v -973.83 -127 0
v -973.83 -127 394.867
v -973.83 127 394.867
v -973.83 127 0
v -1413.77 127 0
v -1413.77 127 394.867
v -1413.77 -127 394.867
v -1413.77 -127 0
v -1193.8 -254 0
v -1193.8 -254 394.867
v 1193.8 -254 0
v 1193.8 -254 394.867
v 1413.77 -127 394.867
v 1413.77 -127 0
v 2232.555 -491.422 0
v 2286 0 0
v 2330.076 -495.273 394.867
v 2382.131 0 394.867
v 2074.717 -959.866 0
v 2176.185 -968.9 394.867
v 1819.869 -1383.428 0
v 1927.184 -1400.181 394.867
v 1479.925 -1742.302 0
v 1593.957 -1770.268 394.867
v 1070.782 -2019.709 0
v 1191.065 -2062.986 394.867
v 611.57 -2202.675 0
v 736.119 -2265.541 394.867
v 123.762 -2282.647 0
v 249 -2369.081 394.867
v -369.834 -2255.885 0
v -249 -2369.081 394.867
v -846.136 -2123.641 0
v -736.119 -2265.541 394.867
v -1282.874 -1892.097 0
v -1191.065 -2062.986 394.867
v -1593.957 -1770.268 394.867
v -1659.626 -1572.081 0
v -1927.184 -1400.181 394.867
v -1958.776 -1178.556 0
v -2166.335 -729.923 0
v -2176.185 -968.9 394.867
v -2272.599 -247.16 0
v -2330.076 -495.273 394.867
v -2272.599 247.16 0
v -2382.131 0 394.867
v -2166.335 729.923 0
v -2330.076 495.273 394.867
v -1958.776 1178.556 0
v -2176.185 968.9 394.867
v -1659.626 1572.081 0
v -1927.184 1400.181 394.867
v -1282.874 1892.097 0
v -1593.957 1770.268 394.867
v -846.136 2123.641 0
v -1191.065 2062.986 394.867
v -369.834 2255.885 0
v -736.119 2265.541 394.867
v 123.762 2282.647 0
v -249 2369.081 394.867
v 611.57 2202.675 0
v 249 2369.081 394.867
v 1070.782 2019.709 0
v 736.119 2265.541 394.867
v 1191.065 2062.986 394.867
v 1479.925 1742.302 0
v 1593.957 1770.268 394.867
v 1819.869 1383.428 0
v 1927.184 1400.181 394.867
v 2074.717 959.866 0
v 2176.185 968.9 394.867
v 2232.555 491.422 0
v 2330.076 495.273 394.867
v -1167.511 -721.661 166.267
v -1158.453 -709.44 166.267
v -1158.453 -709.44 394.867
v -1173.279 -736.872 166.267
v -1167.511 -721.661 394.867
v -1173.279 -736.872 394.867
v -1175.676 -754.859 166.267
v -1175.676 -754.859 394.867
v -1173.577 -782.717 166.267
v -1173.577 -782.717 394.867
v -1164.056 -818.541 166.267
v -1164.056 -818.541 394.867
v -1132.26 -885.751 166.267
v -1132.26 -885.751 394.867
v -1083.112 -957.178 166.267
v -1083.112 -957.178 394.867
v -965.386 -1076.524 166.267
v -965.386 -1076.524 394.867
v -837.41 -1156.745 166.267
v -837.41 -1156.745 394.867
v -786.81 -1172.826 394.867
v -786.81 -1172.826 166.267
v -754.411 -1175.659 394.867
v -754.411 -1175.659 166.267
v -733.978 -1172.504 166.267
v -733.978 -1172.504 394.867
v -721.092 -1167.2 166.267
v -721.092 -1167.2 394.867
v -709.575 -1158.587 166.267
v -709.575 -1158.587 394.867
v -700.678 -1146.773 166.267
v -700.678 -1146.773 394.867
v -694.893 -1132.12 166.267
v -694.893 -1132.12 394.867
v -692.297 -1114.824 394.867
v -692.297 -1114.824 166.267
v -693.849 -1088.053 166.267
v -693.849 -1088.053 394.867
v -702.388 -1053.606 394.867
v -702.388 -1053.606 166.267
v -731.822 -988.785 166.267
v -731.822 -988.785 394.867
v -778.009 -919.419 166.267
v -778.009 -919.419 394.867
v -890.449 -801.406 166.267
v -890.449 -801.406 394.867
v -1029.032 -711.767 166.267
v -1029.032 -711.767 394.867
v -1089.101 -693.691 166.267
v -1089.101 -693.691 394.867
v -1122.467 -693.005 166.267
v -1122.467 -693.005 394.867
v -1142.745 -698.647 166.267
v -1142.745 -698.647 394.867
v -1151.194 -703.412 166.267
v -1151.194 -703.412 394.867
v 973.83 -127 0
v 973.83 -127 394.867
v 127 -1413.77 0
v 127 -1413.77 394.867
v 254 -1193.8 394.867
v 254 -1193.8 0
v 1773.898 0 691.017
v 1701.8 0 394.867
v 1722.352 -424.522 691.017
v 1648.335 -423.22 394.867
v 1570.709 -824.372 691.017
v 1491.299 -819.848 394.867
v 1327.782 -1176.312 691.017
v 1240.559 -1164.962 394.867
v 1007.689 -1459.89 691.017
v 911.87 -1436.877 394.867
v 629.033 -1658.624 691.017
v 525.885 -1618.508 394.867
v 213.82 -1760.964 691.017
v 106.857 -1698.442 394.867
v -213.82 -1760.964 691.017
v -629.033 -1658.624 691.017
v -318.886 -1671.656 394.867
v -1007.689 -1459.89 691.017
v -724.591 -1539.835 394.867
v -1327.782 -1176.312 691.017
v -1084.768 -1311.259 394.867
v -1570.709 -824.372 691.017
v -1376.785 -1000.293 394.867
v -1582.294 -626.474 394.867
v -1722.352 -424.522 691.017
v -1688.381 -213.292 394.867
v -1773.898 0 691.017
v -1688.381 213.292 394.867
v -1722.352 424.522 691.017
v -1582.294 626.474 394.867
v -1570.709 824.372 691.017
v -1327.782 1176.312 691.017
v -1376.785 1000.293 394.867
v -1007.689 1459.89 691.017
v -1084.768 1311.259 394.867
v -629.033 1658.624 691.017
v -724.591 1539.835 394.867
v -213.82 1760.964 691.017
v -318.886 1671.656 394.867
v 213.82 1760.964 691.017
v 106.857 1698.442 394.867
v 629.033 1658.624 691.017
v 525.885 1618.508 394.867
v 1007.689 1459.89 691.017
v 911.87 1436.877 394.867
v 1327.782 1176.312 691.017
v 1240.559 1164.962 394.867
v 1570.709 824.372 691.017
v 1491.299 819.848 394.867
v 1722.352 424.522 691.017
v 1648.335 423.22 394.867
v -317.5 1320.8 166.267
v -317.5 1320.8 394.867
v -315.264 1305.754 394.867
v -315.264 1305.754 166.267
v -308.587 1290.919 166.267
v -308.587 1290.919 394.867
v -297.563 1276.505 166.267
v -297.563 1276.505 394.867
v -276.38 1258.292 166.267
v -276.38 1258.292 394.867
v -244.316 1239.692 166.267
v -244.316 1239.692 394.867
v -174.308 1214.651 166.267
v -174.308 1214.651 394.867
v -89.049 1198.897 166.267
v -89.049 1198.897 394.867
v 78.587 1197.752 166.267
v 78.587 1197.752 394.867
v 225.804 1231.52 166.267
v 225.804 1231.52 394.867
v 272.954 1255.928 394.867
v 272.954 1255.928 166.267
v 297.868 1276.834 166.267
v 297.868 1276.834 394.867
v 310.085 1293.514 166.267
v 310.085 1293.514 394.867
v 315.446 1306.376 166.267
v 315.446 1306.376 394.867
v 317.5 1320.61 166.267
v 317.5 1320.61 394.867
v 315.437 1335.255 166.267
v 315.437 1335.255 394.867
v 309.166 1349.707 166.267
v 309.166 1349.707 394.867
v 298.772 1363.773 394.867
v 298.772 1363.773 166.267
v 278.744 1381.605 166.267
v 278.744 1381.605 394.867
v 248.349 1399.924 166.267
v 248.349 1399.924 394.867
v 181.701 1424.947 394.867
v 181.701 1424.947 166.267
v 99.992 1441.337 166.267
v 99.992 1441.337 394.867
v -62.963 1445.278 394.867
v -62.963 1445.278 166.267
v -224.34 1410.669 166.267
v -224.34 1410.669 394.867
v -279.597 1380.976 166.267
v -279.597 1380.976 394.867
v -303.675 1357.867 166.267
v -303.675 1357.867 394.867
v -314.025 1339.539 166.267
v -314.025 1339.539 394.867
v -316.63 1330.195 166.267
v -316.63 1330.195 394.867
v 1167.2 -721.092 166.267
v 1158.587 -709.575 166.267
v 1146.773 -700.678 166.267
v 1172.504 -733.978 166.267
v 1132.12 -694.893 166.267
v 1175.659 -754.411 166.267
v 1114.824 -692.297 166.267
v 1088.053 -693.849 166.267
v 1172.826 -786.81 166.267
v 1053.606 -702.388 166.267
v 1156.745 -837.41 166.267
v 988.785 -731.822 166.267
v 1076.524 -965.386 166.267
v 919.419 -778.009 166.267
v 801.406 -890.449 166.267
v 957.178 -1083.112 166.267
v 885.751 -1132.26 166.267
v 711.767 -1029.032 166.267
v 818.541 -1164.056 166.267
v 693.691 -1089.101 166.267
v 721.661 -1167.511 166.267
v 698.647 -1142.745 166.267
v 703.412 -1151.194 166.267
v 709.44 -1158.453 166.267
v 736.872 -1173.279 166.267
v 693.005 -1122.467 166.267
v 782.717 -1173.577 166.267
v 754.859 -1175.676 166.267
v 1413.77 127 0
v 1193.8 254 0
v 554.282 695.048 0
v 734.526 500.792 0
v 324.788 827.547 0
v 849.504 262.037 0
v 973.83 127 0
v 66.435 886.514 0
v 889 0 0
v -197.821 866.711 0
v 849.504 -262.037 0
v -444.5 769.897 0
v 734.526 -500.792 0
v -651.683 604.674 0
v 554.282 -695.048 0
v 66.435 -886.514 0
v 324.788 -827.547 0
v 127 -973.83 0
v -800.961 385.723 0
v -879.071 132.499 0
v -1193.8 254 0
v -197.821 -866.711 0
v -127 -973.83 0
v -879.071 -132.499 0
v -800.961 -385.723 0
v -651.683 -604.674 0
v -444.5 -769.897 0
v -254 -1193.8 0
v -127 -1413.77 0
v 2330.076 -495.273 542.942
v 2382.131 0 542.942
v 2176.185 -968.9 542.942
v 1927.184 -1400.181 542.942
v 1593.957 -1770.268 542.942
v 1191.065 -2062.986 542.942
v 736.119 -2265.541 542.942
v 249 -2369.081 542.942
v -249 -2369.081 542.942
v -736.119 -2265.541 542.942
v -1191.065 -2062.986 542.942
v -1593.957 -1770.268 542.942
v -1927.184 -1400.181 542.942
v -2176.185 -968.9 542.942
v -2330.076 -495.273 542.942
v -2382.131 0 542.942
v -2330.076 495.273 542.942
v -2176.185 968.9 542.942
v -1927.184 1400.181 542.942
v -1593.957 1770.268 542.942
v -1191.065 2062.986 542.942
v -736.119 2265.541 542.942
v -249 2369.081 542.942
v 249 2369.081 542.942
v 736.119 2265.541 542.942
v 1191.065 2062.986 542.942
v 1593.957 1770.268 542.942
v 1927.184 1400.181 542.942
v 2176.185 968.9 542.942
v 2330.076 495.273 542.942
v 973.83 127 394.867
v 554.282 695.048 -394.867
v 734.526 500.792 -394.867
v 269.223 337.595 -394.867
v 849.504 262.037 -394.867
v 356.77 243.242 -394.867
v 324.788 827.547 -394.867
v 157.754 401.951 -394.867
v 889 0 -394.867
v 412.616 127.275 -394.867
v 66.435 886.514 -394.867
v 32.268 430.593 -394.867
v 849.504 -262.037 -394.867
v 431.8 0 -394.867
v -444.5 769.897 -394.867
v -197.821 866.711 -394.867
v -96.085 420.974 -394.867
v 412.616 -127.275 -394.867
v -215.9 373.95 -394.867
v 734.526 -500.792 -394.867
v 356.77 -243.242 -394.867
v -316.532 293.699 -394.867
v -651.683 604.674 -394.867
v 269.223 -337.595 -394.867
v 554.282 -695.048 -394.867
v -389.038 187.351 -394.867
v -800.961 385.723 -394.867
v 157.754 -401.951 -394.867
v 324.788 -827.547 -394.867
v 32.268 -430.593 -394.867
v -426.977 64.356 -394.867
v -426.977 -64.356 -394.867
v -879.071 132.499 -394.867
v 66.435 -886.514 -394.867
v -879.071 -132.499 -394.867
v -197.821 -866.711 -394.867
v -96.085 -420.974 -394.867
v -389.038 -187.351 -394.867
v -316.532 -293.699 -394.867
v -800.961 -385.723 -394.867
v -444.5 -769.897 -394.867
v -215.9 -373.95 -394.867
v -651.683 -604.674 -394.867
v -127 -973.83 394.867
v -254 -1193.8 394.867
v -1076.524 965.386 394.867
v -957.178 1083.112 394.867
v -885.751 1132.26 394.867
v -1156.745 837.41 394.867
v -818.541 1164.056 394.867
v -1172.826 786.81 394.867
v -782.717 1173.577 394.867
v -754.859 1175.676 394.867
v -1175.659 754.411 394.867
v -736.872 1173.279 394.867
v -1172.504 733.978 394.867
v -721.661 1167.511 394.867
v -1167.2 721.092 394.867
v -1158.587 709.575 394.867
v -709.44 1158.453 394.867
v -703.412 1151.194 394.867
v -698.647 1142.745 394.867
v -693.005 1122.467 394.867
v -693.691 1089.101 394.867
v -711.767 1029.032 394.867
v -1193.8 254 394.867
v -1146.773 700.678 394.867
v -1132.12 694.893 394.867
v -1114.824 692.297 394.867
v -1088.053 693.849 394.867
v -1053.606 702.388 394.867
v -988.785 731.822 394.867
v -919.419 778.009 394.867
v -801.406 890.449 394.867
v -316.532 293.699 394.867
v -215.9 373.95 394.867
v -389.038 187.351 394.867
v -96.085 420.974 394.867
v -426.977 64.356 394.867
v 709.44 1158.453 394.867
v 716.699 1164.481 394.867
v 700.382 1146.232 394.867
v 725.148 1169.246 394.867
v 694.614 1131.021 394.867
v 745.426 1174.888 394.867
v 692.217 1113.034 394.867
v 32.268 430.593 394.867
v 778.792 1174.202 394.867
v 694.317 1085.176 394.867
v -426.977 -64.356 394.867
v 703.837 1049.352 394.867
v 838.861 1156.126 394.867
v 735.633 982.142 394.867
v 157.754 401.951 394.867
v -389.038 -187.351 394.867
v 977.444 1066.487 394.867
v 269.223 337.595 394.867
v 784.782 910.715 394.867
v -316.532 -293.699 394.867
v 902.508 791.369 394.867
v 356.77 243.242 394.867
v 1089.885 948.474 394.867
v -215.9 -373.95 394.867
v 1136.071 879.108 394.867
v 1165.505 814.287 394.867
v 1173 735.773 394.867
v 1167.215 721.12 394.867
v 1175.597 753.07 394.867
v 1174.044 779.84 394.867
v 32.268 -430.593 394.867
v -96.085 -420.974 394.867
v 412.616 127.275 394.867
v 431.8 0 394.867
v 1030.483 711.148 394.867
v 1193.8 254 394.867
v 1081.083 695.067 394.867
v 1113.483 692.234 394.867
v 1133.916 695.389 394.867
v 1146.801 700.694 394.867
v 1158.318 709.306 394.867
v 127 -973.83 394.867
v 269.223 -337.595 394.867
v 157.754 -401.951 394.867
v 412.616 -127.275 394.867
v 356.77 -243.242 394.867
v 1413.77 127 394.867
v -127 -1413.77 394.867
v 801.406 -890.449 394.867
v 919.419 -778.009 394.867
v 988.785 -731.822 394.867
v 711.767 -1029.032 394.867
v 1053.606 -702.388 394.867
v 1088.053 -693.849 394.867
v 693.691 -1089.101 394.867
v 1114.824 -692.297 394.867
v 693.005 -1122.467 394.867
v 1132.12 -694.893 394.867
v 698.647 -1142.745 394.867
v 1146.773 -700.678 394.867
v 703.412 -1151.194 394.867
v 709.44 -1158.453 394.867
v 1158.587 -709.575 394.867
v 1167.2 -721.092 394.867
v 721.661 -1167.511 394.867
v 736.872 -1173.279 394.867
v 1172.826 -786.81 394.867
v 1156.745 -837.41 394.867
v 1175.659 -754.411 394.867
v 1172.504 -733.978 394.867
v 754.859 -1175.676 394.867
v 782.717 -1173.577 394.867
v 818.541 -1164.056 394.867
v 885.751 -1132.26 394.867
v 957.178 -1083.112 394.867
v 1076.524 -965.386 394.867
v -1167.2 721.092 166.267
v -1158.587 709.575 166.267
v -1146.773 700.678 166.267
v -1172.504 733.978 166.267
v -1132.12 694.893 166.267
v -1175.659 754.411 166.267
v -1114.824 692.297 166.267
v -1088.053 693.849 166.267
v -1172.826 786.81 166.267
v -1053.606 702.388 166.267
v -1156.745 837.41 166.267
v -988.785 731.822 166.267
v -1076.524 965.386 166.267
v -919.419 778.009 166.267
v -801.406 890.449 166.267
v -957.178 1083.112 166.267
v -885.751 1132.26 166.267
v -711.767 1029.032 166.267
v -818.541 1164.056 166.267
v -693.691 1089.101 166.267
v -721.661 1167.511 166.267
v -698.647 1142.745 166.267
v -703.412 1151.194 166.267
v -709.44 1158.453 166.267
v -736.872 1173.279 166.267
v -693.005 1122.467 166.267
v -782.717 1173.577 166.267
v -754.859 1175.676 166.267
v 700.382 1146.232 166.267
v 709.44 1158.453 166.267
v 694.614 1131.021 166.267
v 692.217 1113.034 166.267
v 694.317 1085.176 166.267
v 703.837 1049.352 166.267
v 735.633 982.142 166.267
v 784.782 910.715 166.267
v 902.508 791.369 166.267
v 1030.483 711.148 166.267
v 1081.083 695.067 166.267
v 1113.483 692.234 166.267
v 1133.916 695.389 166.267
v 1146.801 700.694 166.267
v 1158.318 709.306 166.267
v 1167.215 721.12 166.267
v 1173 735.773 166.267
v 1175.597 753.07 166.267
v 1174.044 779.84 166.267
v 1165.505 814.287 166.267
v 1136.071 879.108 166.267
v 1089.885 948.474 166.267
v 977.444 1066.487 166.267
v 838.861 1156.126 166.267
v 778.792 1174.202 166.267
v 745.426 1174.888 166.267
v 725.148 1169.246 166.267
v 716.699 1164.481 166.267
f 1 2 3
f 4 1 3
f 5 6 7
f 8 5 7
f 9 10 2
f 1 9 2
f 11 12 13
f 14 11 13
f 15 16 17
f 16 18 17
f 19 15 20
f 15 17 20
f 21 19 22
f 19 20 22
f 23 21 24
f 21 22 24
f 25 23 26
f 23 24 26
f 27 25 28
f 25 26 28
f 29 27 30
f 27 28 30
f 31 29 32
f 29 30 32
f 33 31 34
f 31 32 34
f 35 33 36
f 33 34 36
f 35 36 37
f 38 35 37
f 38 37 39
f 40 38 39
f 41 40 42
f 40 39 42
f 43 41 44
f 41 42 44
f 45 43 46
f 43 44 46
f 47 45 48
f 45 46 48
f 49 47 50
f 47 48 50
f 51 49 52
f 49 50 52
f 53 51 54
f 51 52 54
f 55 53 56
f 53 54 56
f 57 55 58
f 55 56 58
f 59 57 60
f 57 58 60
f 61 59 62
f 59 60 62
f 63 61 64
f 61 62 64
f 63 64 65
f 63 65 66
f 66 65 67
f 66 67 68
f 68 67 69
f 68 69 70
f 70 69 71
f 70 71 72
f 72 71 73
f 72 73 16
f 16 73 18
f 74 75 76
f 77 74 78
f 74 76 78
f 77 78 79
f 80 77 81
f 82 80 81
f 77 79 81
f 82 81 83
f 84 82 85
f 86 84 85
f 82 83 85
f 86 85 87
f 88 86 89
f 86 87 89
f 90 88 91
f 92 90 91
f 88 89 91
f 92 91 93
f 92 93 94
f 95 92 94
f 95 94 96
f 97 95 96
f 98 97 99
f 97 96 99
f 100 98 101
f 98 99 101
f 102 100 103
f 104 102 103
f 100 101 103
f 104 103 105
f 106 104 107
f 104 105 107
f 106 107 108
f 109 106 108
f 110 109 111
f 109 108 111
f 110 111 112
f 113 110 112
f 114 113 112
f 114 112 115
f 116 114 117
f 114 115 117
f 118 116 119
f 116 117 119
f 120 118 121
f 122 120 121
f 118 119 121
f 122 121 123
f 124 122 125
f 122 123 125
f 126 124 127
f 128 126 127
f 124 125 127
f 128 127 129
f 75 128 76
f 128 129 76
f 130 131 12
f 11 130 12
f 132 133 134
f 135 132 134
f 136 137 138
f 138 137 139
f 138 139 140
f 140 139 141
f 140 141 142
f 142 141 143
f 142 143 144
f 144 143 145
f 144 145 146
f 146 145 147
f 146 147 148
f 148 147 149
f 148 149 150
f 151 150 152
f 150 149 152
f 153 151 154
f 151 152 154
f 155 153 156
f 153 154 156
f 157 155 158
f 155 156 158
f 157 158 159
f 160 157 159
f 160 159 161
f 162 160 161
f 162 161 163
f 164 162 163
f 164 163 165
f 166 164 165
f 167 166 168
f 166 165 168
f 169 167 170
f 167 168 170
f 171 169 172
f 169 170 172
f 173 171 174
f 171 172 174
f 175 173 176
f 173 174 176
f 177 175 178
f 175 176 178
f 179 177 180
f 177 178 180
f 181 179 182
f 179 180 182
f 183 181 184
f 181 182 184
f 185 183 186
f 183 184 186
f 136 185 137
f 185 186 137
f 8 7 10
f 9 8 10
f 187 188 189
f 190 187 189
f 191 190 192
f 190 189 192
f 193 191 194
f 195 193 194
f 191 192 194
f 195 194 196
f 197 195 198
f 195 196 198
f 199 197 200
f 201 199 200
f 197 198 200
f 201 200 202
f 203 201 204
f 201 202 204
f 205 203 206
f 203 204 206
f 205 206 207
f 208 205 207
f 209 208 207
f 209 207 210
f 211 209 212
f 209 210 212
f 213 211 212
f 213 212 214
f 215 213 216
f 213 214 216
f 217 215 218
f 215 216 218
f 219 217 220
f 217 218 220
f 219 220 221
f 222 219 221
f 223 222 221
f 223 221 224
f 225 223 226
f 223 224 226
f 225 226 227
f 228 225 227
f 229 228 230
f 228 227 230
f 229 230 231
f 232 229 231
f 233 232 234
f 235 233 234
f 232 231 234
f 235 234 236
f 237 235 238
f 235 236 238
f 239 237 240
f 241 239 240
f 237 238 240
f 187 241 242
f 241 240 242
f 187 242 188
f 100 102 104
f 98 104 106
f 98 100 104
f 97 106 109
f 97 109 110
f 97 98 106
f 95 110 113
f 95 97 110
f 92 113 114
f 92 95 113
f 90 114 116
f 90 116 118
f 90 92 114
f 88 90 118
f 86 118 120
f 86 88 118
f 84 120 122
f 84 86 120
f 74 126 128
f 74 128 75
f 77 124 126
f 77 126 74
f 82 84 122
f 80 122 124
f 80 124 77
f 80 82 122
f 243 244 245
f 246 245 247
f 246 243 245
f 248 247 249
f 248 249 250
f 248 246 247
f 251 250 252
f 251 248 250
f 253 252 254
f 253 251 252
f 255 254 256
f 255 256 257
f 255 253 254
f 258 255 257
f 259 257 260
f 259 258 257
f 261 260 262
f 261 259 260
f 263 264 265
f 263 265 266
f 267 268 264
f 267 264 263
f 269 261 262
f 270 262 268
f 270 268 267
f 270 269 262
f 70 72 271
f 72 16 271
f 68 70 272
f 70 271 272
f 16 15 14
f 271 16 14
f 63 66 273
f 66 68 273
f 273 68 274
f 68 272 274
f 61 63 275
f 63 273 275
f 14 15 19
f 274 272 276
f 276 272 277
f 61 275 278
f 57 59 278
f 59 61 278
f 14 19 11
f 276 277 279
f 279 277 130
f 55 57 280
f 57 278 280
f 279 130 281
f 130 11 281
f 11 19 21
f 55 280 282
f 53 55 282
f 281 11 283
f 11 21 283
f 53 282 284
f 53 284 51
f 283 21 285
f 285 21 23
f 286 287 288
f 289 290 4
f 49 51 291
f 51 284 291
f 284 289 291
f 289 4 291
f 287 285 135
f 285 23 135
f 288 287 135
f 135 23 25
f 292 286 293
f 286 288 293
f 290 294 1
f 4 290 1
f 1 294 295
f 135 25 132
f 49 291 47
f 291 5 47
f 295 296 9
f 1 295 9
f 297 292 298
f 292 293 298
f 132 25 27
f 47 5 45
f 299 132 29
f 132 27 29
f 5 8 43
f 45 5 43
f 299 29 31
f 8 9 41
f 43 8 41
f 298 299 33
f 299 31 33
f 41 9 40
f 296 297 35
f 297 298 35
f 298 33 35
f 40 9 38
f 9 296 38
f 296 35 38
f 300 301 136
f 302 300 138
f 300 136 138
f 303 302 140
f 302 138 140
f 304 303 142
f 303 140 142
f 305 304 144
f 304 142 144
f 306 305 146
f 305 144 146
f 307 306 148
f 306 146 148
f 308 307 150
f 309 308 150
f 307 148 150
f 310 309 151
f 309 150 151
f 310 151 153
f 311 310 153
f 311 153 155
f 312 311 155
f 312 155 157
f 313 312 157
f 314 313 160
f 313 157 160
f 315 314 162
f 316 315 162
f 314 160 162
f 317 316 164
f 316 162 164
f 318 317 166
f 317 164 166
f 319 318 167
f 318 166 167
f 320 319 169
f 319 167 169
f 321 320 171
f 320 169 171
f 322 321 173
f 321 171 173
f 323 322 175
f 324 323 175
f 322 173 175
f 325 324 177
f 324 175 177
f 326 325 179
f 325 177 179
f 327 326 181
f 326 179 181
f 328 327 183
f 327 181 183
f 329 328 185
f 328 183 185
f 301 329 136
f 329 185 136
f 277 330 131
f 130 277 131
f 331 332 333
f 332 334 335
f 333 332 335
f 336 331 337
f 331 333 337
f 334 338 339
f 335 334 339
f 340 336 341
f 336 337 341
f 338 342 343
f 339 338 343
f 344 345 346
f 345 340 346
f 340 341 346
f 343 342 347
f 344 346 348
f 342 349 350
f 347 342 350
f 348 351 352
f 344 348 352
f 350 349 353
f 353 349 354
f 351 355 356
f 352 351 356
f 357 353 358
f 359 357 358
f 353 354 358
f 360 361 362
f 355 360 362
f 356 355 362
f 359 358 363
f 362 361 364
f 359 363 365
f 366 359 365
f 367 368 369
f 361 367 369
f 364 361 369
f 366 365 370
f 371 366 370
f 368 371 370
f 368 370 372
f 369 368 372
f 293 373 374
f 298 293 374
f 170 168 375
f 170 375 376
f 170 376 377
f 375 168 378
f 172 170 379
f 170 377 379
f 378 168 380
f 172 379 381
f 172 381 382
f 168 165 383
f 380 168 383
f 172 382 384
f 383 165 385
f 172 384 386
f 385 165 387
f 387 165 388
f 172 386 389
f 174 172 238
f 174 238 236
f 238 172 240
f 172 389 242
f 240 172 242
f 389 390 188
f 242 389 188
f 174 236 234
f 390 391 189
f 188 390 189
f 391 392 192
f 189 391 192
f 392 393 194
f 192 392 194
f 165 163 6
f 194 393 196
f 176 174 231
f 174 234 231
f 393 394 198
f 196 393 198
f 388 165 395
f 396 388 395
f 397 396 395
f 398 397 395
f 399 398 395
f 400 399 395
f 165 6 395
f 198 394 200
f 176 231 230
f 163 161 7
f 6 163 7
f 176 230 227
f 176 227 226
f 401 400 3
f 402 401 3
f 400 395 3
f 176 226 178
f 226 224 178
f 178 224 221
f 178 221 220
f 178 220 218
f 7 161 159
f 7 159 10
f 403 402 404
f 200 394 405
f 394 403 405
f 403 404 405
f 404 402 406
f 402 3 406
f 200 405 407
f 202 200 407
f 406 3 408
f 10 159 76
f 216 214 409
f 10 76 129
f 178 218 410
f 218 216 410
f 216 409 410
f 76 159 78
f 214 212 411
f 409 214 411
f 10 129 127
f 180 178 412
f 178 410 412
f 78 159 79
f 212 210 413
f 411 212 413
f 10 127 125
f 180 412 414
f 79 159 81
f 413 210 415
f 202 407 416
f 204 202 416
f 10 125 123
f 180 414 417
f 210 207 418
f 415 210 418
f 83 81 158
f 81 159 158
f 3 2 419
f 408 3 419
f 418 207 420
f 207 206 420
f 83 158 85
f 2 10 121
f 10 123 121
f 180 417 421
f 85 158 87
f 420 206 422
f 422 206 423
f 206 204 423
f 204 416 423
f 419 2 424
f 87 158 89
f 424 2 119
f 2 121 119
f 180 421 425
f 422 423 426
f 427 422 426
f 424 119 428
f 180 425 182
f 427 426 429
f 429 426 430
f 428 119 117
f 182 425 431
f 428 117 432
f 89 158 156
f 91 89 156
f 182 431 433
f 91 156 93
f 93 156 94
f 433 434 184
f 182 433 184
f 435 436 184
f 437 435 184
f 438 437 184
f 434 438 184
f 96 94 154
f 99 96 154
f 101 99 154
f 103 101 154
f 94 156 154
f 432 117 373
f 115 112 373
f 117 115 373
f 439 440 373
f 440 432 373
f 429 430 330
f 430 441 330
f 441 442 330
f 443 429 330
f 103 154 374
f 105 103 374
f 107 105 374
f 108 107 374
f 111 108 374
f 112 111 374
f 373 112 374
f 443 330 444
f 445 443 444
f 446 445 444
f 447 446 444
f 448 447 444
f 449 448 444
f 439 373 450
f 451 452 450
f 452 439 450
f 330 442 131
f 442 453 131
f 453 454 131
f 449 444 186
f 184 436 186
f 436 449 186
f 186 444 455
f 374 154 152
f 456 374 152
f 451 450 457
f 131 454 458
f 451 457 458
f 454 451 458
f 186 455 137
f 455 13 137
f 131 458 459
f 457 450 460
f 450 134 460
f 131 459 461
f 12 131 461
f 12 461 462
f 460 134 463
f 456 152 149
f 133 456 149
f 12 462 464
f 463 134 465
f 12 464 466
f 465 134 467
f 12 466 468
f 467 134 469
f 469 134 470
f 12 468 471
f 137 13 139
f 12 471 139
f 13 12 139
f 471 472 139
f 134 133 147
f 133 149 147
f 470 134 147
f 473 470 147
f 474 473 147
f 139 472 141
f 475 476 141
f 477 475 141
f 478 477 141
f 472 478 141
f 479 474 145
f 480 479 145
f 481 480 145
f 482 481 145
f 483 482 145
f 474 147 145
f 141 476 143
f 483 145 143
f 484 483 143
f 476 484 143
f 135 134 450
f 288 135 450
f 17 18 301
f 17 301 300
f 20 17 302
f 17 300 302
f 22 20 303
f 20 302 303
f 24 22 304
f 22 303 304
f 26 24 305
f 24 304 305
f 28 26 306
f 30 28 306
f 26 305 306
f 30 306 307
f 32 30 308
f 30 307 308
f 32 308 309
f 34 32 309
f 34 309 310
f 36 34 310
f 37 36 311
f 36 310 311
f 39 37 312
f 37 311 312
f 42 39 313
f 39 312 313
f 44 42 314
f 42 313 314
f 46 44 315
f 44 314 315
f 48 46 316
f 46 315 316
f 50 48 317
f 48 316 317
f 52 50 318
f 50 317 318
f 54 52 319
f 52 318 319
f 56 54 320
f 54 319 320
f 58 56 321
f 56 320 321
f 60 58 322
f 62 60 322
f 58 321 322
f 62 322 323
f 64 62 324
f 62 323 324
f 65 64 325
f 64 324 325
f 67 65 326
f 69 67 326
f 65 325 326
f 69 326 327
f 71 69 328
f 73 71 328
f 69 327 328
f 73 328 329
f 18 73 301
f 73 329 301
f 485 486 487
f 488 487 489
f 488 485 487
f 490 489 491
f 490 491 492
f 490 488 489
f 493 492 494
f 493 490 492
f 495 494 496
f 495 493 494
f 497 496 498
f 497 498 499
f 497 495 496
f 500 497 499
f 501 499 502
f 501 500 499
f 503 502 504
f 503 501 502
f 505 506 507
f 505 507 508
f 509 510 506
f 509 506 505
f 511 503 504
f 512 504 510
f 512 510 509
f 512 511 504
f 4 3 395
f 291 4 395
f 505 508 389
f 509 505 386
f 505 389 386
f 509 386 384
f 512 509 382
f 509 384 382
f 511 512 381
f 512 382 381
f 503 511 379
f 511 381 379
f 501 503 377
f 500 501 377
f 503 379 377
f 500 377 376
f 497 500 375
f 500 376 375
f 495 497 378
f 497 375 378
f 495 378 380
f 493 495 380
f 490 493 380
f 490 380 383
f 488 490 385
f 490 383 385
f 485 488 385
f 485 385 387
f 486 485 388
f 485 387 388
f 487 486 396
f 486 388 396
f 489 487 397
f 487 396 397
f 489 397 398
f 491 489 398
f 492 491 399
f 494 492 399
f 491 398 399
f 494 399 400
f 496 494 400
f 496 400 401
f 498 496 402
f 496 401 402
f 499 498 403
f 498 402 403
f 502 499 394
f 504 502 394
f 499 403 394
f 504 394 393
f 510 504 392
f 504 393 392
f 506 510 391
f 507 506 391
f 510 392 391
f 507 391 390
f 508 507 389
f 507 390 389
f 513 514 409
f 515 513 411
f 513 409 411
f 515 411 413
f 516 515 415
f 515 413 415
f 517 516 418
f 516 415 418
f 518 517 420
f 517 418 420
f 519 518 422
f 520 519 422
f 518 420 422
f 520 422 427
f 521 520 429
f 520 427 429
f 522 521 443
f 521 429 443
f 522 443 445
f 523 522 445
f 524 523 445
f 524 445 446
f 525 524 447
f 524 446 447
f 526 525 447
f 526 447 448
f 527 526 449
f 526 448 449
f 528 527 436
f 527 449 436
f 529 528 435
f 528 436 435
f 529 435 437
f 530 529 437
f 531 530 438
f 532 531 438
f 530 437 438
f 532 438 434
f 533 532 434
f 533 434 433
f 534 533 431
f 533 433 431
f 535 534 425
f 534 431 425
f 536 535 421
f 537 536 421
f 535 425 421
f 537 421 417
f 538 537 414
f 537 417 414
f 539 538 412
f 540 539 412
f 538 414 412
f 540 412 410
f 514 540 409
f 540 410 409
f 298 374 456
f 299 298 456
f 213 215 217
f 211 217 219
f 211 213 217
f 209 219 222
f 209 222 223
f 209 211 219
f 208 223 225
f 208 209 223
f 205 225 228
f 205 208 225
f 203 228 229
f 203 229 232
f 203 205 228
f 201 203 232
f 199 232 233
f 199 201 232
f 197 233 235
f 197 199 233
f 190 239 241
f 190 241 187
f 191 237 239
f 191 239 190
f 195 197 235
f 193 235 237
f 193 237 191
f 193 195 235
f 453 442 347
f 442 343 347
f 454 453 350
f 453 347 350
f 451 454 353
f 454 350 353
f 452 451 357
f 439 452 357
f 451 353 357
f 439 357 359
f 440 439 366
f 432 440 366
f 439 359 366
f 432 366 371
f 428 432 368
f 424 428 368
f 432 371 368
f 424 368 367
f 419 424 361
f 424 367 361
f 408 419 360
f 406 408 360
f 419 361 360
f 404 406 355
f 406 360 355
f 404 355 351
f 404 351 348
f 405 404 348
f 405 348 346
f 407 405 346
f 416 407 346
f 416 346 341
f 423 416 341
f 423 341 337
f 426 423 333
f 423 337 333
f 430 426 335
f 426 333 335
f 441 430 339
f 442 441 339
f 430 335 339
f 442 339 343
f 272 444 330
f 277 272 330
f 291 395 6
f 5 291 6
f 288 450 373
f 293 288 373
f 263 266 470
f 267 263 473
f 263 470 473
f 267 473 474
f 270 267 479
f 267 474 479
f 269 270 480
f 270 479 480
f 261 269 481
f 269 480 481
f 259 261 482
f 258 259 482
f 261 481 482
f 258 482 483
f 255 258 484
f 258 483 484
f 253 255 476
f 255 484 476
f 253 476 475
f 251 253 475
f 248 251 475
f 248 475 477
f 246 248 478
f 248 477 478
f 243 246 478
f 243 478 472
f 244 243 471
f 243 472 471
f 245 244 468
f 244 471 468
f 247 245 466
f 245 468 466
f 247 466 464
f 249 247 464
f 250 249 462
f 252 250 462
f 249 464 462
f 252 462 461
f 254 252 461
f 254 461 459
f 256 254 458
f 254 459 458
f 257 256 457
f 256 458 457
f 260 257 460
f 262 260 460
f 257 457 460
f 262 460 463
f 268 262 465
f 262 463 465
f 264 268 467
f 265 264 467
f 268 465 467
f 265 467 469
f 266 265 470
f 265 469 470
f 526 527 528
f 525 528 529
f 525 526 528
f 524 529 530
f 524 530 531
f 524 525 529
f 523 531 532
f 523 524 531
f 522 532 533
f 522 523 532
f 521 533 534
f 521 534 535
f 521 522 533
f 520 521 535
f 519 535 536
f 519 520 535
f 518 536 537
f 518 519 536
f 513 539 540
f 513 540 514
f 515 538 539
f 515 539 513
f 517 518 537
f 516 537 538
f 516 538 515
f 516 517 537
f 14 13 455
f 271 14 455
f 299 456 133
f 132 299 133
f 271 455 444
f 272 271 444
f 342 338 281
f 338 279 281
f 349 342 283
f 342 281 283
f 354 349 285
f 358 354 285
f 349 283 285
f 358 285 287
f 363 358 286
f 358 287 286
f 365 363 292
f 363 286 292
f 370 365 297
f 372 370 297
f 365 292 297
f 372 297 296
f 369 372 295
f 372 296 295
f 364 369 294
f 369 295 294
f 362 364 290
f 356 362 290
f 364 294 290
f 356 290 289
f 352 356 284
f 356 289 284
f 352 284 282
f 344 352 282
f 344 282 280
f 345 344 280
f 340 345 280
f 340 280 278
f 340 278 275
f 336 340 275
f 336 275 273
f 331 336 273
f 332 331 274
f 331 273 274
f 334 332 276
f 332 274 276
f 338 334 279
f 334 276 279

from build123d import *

# Parameters (mm, degrees)
SKETCH2_RX         = 317.5
SKETCH2_RY         = 127
CUT_EXTRUDE2_DEPTH = 228.6
CUT_EXTRUDE3_DEPTH = 3461.169664997


with BuildPart() as part:
    # Sketch1 → Revolve1 (revolve)
    with BuildSketch(Plane(origin=(0, 0, 0), x_dir=(0, 0, -1), z_dir=(1, 0, 0)), mode=Mode.PRIVATE) as revolve1_sk:
        Polygon((-394.866836272, 431.8), (394.866836272, 431.8), (394.866836272, 889), (0, 889), (0, 2286), (-394.866836272, 2382.130856714), (-542.941899874, 2382.130856714), (-691.016963476, 1773.898142535), (-394.866836272, 1701.8), align=None)
    revolve(revolve1_sk.sketch.rotate(Axis((0, 0, 0), (0, 0, -1)), 90), axis=Axis((0, 0, 0), (0, 0, -1)))

    # Sketch2 → Cut-Extrude2 (cut)
    with BuildSketch(Plane.XY.offset(394.866836272)):
        with Locations(Location((0, 1320.8), (0, 0, 180))):
            Ellipse(SKETCH2_RX, SKETCH2_RY)
        with Locations(Location((933.946636591, 933.946636591), (0, 0, 135))):
            Ellipse(SKETCH2_RX, SKETCH2_RY)
        with Locations(Location((933.946636591, -933.946636591), (0, 0, -135))):
            Ellipse(SKETCH2_RX, SKETCH2_RY)
        with Locations(Location((-933.946636591, -933.946636591), (0, 0, 135))):
            Ellipse(SKETCH2_RX, SKETCH2_RY)
        with Locations(Location((-933.946636591, 933.946636591), (0, 0, 45))):
            Ellipse(SKETCH2_RX, SKETCH2_RY)
    extrude(amount=-CUT_EXTRUDE2_DEPTH, mode=Mode.SUBTRACT)

    # Sketch3 → Cut-Extrude3 (cut, through all)
    with BuildSketch(Plane.XY.offset(394.866836272)):
        Polygon((254, -1193.8), (127, -973.829547439), (-127, -973.829547439), (-254, -1193.8), (-127, -1413.770452561), (127, -1413.770452561), align=None)
        Polygon((-1193.8, -254), (-973.829547439, -127), (-973.829547439, 127), (-1193.8, 254), (-1413.770452561, 127), (-1413.770452561, -127), align=None)
        Polygon((1193.8, 254), (973.829547439, 127), (973.829547439, -127), (1193.8, -254), (1413.770452561, -127), (1413.770452561, 127), align=None)
    extrude(amount=-CUT_EXTRUDE3_DEPTH, mode=Mode.SUBTRACT)


solid = part.part
